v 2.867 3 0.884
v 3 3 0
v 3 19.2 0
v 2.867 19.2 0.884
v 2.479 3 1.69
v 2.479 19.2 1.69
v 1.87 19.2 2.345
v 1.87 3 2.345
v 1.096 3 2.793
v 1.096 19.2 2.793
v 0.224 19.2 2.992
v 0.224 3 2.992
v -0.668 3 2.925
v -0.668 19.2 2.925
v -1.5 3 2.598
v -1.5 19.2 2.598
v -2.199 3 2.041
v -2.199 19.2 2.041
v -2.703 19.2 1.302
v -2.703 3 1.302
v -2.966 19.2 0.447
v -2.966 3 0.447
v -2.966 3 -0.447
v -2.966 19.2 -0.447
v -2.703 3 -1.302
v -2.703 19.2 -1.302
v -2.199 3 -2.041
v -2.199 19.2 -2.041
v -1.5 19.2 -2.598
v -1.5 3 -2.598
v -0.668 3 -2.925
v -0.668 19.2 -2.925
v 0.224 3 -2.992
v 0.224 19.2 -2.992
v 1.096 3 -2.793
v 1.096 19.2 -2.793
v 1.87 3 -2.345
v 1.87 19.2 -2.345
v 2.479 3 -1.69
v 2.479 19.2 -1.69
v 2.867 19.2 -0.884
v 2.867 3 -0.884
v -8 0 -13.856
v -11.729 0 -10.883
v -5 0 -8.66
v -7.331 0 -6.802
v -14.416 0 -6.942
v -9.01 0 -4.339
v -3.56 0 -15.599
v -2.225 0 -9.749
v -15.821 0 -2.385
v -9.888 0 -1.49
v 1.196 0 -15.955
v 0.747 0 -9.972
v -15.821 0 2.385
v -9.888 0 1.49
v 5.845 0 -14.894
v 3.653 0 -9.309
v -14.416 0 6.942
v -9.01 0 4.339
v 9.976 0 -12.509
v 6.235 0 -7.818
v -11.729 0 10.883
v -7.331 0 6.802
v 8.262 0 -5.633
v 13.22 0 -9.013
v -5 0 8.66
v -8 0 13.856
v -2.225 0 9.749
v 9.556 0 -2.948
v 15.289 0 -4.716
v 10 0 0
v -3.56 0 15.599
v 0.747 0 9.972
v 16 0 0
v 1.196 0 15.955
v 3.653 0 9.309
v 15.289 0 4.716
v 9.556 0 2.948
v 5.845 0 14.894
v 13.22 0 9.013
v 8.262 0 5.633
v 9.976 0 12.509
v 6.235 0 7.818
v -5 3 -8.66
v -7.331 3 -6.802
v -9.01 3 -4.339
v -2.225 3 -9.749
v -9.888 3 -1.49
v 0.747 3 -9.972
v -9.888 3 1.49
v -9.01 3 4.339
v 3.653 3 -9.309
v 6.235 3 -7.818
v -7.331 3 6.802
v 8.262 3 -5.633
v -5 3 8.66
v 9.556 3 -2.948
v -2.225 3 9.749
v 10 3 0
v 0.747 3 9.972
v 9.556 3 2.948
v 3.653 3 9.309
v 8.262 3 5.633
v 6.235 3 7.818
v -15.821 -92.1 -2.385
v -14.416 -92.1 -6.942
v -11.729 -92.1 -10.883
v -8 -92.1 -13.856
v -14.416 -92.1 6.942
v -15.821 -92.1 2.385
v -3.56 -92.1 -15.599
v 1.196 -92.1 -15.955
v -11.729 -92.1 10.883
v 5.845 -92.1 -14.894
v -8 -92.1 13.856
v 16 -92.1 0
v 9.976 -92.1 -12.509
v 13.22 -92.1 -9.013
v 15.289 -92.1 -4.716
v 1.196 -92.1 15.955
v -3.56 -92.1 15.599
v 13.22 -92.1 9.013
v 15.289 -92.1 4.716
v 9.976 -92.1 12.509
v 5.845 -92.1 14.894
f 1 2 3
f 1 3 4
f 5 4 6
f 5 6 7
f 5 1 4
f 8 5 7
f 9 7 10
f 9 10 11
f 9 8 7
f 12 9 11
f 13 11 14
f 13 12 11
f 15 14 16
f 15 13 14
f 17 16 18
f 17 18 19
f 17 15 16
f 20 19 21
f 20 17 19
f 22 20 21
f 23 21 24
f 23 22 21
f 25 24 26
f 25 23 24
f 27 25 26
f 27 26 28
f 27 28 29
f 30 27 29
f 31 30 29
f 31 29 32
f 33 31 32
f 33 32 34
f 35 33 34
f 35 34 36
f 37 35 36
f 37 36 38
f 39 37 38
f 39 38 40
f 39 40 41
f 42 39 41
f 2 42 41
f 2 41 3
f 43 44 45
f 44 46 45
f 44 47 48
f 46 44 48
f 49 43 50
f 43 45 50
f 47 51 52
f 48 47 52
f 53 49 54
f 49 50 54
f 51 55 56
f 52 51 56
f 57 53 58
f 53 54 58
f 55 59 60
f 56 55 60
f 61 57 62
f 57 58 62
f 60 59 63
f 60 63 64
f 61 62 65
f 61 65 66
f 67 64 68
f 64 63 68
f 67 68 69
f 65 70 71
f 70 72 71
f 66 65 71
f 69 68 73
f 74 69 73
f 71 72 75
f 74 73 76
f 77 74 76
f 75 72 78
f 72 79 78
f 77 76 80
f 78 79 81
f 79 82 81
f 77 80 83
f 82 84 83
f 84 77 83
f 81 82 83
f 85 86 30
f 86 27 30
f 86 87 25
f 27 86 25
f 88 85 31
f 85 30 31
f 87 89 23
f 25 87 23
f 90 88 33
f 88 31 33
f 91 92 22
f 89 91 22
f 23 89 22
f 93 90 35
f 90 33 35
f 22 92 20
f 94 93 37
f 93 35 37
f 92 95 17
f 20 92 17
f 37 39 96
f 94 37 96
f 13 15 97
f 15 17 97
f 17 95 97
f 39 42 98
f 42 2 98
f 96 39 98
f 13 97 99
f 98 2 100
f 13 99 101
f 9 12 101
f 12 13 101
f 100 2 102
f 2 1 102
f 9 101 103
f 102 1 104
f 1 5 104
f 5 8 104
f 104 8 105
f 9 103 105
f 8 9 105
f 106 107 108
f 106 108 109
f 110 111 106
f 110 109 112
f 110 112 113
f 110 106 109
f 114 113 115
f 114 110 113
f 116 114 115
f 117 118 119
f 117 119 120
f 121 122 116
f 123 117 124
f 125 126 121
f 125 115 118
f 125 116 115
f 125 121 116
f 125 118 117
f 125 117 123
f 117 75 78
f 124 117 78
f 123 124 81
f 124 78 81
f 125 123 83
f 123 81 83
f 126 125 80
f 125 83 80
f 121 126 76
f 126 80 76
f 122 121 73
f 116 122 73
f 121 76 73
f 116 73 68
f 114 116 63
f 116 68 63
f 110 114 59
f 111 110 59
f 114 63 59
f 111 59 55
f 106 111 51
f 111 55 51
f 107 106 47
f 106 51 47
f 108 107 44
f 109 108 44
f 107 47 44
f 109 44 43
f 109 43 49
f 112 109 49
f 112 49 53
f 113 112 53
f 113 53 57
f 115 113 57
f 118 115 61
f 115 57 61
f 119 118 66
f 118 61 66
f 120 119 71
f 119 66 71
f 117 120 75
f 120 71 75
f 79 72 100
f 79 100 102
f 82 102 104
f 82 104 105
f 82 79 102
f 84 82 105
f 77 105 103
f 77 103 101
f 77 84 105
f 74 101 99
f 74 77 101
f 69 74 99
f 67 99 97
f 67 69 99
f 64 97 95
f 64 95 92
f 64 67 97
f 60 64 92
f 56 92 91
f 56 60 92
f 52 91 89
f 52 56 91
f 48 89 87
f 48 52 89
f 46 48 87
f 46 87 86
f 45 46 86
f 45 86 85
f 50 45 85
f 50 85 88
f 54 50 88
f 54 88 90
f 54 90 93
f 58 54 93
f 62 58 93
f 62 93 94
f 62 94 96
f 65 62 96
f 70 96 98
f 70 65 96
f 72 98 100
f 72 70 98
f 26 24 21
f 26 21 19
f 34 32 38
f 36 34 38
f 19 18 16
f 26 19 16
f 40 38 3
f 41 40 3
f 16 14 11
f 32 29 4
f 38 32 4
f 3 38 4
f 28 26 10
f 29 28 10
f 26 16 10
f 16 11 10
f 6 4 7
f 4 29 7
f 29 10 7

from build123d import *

# Parameters (mm, degrees)
F0_R     = 10
F3_DEPTH = 3
F2_R     = 3
F4_DEPTH = 19.2
F1_R     = 16
F5_DEPTH = 92.1


with BuildPart() as f3:
    # F0 (on Front) → F3 (new body)
    with BuildSketch(Plane.XZ):
        Circle(F0_R)
    extrude(amount=-F3_DEPTH)

    # F2 (on Front) → F4 (join)
    with BuildSketch(Plane.XZ):
        Circle(F2_R)
    extrude(amount=-F4_DEPTH)

    # F1 (on Front) → F5 (join)
    with BuildSketch(Plane.XZ):
        Circle(F1_R)
    extrude(amount=F5_DEPTH)


solid = f3.part
